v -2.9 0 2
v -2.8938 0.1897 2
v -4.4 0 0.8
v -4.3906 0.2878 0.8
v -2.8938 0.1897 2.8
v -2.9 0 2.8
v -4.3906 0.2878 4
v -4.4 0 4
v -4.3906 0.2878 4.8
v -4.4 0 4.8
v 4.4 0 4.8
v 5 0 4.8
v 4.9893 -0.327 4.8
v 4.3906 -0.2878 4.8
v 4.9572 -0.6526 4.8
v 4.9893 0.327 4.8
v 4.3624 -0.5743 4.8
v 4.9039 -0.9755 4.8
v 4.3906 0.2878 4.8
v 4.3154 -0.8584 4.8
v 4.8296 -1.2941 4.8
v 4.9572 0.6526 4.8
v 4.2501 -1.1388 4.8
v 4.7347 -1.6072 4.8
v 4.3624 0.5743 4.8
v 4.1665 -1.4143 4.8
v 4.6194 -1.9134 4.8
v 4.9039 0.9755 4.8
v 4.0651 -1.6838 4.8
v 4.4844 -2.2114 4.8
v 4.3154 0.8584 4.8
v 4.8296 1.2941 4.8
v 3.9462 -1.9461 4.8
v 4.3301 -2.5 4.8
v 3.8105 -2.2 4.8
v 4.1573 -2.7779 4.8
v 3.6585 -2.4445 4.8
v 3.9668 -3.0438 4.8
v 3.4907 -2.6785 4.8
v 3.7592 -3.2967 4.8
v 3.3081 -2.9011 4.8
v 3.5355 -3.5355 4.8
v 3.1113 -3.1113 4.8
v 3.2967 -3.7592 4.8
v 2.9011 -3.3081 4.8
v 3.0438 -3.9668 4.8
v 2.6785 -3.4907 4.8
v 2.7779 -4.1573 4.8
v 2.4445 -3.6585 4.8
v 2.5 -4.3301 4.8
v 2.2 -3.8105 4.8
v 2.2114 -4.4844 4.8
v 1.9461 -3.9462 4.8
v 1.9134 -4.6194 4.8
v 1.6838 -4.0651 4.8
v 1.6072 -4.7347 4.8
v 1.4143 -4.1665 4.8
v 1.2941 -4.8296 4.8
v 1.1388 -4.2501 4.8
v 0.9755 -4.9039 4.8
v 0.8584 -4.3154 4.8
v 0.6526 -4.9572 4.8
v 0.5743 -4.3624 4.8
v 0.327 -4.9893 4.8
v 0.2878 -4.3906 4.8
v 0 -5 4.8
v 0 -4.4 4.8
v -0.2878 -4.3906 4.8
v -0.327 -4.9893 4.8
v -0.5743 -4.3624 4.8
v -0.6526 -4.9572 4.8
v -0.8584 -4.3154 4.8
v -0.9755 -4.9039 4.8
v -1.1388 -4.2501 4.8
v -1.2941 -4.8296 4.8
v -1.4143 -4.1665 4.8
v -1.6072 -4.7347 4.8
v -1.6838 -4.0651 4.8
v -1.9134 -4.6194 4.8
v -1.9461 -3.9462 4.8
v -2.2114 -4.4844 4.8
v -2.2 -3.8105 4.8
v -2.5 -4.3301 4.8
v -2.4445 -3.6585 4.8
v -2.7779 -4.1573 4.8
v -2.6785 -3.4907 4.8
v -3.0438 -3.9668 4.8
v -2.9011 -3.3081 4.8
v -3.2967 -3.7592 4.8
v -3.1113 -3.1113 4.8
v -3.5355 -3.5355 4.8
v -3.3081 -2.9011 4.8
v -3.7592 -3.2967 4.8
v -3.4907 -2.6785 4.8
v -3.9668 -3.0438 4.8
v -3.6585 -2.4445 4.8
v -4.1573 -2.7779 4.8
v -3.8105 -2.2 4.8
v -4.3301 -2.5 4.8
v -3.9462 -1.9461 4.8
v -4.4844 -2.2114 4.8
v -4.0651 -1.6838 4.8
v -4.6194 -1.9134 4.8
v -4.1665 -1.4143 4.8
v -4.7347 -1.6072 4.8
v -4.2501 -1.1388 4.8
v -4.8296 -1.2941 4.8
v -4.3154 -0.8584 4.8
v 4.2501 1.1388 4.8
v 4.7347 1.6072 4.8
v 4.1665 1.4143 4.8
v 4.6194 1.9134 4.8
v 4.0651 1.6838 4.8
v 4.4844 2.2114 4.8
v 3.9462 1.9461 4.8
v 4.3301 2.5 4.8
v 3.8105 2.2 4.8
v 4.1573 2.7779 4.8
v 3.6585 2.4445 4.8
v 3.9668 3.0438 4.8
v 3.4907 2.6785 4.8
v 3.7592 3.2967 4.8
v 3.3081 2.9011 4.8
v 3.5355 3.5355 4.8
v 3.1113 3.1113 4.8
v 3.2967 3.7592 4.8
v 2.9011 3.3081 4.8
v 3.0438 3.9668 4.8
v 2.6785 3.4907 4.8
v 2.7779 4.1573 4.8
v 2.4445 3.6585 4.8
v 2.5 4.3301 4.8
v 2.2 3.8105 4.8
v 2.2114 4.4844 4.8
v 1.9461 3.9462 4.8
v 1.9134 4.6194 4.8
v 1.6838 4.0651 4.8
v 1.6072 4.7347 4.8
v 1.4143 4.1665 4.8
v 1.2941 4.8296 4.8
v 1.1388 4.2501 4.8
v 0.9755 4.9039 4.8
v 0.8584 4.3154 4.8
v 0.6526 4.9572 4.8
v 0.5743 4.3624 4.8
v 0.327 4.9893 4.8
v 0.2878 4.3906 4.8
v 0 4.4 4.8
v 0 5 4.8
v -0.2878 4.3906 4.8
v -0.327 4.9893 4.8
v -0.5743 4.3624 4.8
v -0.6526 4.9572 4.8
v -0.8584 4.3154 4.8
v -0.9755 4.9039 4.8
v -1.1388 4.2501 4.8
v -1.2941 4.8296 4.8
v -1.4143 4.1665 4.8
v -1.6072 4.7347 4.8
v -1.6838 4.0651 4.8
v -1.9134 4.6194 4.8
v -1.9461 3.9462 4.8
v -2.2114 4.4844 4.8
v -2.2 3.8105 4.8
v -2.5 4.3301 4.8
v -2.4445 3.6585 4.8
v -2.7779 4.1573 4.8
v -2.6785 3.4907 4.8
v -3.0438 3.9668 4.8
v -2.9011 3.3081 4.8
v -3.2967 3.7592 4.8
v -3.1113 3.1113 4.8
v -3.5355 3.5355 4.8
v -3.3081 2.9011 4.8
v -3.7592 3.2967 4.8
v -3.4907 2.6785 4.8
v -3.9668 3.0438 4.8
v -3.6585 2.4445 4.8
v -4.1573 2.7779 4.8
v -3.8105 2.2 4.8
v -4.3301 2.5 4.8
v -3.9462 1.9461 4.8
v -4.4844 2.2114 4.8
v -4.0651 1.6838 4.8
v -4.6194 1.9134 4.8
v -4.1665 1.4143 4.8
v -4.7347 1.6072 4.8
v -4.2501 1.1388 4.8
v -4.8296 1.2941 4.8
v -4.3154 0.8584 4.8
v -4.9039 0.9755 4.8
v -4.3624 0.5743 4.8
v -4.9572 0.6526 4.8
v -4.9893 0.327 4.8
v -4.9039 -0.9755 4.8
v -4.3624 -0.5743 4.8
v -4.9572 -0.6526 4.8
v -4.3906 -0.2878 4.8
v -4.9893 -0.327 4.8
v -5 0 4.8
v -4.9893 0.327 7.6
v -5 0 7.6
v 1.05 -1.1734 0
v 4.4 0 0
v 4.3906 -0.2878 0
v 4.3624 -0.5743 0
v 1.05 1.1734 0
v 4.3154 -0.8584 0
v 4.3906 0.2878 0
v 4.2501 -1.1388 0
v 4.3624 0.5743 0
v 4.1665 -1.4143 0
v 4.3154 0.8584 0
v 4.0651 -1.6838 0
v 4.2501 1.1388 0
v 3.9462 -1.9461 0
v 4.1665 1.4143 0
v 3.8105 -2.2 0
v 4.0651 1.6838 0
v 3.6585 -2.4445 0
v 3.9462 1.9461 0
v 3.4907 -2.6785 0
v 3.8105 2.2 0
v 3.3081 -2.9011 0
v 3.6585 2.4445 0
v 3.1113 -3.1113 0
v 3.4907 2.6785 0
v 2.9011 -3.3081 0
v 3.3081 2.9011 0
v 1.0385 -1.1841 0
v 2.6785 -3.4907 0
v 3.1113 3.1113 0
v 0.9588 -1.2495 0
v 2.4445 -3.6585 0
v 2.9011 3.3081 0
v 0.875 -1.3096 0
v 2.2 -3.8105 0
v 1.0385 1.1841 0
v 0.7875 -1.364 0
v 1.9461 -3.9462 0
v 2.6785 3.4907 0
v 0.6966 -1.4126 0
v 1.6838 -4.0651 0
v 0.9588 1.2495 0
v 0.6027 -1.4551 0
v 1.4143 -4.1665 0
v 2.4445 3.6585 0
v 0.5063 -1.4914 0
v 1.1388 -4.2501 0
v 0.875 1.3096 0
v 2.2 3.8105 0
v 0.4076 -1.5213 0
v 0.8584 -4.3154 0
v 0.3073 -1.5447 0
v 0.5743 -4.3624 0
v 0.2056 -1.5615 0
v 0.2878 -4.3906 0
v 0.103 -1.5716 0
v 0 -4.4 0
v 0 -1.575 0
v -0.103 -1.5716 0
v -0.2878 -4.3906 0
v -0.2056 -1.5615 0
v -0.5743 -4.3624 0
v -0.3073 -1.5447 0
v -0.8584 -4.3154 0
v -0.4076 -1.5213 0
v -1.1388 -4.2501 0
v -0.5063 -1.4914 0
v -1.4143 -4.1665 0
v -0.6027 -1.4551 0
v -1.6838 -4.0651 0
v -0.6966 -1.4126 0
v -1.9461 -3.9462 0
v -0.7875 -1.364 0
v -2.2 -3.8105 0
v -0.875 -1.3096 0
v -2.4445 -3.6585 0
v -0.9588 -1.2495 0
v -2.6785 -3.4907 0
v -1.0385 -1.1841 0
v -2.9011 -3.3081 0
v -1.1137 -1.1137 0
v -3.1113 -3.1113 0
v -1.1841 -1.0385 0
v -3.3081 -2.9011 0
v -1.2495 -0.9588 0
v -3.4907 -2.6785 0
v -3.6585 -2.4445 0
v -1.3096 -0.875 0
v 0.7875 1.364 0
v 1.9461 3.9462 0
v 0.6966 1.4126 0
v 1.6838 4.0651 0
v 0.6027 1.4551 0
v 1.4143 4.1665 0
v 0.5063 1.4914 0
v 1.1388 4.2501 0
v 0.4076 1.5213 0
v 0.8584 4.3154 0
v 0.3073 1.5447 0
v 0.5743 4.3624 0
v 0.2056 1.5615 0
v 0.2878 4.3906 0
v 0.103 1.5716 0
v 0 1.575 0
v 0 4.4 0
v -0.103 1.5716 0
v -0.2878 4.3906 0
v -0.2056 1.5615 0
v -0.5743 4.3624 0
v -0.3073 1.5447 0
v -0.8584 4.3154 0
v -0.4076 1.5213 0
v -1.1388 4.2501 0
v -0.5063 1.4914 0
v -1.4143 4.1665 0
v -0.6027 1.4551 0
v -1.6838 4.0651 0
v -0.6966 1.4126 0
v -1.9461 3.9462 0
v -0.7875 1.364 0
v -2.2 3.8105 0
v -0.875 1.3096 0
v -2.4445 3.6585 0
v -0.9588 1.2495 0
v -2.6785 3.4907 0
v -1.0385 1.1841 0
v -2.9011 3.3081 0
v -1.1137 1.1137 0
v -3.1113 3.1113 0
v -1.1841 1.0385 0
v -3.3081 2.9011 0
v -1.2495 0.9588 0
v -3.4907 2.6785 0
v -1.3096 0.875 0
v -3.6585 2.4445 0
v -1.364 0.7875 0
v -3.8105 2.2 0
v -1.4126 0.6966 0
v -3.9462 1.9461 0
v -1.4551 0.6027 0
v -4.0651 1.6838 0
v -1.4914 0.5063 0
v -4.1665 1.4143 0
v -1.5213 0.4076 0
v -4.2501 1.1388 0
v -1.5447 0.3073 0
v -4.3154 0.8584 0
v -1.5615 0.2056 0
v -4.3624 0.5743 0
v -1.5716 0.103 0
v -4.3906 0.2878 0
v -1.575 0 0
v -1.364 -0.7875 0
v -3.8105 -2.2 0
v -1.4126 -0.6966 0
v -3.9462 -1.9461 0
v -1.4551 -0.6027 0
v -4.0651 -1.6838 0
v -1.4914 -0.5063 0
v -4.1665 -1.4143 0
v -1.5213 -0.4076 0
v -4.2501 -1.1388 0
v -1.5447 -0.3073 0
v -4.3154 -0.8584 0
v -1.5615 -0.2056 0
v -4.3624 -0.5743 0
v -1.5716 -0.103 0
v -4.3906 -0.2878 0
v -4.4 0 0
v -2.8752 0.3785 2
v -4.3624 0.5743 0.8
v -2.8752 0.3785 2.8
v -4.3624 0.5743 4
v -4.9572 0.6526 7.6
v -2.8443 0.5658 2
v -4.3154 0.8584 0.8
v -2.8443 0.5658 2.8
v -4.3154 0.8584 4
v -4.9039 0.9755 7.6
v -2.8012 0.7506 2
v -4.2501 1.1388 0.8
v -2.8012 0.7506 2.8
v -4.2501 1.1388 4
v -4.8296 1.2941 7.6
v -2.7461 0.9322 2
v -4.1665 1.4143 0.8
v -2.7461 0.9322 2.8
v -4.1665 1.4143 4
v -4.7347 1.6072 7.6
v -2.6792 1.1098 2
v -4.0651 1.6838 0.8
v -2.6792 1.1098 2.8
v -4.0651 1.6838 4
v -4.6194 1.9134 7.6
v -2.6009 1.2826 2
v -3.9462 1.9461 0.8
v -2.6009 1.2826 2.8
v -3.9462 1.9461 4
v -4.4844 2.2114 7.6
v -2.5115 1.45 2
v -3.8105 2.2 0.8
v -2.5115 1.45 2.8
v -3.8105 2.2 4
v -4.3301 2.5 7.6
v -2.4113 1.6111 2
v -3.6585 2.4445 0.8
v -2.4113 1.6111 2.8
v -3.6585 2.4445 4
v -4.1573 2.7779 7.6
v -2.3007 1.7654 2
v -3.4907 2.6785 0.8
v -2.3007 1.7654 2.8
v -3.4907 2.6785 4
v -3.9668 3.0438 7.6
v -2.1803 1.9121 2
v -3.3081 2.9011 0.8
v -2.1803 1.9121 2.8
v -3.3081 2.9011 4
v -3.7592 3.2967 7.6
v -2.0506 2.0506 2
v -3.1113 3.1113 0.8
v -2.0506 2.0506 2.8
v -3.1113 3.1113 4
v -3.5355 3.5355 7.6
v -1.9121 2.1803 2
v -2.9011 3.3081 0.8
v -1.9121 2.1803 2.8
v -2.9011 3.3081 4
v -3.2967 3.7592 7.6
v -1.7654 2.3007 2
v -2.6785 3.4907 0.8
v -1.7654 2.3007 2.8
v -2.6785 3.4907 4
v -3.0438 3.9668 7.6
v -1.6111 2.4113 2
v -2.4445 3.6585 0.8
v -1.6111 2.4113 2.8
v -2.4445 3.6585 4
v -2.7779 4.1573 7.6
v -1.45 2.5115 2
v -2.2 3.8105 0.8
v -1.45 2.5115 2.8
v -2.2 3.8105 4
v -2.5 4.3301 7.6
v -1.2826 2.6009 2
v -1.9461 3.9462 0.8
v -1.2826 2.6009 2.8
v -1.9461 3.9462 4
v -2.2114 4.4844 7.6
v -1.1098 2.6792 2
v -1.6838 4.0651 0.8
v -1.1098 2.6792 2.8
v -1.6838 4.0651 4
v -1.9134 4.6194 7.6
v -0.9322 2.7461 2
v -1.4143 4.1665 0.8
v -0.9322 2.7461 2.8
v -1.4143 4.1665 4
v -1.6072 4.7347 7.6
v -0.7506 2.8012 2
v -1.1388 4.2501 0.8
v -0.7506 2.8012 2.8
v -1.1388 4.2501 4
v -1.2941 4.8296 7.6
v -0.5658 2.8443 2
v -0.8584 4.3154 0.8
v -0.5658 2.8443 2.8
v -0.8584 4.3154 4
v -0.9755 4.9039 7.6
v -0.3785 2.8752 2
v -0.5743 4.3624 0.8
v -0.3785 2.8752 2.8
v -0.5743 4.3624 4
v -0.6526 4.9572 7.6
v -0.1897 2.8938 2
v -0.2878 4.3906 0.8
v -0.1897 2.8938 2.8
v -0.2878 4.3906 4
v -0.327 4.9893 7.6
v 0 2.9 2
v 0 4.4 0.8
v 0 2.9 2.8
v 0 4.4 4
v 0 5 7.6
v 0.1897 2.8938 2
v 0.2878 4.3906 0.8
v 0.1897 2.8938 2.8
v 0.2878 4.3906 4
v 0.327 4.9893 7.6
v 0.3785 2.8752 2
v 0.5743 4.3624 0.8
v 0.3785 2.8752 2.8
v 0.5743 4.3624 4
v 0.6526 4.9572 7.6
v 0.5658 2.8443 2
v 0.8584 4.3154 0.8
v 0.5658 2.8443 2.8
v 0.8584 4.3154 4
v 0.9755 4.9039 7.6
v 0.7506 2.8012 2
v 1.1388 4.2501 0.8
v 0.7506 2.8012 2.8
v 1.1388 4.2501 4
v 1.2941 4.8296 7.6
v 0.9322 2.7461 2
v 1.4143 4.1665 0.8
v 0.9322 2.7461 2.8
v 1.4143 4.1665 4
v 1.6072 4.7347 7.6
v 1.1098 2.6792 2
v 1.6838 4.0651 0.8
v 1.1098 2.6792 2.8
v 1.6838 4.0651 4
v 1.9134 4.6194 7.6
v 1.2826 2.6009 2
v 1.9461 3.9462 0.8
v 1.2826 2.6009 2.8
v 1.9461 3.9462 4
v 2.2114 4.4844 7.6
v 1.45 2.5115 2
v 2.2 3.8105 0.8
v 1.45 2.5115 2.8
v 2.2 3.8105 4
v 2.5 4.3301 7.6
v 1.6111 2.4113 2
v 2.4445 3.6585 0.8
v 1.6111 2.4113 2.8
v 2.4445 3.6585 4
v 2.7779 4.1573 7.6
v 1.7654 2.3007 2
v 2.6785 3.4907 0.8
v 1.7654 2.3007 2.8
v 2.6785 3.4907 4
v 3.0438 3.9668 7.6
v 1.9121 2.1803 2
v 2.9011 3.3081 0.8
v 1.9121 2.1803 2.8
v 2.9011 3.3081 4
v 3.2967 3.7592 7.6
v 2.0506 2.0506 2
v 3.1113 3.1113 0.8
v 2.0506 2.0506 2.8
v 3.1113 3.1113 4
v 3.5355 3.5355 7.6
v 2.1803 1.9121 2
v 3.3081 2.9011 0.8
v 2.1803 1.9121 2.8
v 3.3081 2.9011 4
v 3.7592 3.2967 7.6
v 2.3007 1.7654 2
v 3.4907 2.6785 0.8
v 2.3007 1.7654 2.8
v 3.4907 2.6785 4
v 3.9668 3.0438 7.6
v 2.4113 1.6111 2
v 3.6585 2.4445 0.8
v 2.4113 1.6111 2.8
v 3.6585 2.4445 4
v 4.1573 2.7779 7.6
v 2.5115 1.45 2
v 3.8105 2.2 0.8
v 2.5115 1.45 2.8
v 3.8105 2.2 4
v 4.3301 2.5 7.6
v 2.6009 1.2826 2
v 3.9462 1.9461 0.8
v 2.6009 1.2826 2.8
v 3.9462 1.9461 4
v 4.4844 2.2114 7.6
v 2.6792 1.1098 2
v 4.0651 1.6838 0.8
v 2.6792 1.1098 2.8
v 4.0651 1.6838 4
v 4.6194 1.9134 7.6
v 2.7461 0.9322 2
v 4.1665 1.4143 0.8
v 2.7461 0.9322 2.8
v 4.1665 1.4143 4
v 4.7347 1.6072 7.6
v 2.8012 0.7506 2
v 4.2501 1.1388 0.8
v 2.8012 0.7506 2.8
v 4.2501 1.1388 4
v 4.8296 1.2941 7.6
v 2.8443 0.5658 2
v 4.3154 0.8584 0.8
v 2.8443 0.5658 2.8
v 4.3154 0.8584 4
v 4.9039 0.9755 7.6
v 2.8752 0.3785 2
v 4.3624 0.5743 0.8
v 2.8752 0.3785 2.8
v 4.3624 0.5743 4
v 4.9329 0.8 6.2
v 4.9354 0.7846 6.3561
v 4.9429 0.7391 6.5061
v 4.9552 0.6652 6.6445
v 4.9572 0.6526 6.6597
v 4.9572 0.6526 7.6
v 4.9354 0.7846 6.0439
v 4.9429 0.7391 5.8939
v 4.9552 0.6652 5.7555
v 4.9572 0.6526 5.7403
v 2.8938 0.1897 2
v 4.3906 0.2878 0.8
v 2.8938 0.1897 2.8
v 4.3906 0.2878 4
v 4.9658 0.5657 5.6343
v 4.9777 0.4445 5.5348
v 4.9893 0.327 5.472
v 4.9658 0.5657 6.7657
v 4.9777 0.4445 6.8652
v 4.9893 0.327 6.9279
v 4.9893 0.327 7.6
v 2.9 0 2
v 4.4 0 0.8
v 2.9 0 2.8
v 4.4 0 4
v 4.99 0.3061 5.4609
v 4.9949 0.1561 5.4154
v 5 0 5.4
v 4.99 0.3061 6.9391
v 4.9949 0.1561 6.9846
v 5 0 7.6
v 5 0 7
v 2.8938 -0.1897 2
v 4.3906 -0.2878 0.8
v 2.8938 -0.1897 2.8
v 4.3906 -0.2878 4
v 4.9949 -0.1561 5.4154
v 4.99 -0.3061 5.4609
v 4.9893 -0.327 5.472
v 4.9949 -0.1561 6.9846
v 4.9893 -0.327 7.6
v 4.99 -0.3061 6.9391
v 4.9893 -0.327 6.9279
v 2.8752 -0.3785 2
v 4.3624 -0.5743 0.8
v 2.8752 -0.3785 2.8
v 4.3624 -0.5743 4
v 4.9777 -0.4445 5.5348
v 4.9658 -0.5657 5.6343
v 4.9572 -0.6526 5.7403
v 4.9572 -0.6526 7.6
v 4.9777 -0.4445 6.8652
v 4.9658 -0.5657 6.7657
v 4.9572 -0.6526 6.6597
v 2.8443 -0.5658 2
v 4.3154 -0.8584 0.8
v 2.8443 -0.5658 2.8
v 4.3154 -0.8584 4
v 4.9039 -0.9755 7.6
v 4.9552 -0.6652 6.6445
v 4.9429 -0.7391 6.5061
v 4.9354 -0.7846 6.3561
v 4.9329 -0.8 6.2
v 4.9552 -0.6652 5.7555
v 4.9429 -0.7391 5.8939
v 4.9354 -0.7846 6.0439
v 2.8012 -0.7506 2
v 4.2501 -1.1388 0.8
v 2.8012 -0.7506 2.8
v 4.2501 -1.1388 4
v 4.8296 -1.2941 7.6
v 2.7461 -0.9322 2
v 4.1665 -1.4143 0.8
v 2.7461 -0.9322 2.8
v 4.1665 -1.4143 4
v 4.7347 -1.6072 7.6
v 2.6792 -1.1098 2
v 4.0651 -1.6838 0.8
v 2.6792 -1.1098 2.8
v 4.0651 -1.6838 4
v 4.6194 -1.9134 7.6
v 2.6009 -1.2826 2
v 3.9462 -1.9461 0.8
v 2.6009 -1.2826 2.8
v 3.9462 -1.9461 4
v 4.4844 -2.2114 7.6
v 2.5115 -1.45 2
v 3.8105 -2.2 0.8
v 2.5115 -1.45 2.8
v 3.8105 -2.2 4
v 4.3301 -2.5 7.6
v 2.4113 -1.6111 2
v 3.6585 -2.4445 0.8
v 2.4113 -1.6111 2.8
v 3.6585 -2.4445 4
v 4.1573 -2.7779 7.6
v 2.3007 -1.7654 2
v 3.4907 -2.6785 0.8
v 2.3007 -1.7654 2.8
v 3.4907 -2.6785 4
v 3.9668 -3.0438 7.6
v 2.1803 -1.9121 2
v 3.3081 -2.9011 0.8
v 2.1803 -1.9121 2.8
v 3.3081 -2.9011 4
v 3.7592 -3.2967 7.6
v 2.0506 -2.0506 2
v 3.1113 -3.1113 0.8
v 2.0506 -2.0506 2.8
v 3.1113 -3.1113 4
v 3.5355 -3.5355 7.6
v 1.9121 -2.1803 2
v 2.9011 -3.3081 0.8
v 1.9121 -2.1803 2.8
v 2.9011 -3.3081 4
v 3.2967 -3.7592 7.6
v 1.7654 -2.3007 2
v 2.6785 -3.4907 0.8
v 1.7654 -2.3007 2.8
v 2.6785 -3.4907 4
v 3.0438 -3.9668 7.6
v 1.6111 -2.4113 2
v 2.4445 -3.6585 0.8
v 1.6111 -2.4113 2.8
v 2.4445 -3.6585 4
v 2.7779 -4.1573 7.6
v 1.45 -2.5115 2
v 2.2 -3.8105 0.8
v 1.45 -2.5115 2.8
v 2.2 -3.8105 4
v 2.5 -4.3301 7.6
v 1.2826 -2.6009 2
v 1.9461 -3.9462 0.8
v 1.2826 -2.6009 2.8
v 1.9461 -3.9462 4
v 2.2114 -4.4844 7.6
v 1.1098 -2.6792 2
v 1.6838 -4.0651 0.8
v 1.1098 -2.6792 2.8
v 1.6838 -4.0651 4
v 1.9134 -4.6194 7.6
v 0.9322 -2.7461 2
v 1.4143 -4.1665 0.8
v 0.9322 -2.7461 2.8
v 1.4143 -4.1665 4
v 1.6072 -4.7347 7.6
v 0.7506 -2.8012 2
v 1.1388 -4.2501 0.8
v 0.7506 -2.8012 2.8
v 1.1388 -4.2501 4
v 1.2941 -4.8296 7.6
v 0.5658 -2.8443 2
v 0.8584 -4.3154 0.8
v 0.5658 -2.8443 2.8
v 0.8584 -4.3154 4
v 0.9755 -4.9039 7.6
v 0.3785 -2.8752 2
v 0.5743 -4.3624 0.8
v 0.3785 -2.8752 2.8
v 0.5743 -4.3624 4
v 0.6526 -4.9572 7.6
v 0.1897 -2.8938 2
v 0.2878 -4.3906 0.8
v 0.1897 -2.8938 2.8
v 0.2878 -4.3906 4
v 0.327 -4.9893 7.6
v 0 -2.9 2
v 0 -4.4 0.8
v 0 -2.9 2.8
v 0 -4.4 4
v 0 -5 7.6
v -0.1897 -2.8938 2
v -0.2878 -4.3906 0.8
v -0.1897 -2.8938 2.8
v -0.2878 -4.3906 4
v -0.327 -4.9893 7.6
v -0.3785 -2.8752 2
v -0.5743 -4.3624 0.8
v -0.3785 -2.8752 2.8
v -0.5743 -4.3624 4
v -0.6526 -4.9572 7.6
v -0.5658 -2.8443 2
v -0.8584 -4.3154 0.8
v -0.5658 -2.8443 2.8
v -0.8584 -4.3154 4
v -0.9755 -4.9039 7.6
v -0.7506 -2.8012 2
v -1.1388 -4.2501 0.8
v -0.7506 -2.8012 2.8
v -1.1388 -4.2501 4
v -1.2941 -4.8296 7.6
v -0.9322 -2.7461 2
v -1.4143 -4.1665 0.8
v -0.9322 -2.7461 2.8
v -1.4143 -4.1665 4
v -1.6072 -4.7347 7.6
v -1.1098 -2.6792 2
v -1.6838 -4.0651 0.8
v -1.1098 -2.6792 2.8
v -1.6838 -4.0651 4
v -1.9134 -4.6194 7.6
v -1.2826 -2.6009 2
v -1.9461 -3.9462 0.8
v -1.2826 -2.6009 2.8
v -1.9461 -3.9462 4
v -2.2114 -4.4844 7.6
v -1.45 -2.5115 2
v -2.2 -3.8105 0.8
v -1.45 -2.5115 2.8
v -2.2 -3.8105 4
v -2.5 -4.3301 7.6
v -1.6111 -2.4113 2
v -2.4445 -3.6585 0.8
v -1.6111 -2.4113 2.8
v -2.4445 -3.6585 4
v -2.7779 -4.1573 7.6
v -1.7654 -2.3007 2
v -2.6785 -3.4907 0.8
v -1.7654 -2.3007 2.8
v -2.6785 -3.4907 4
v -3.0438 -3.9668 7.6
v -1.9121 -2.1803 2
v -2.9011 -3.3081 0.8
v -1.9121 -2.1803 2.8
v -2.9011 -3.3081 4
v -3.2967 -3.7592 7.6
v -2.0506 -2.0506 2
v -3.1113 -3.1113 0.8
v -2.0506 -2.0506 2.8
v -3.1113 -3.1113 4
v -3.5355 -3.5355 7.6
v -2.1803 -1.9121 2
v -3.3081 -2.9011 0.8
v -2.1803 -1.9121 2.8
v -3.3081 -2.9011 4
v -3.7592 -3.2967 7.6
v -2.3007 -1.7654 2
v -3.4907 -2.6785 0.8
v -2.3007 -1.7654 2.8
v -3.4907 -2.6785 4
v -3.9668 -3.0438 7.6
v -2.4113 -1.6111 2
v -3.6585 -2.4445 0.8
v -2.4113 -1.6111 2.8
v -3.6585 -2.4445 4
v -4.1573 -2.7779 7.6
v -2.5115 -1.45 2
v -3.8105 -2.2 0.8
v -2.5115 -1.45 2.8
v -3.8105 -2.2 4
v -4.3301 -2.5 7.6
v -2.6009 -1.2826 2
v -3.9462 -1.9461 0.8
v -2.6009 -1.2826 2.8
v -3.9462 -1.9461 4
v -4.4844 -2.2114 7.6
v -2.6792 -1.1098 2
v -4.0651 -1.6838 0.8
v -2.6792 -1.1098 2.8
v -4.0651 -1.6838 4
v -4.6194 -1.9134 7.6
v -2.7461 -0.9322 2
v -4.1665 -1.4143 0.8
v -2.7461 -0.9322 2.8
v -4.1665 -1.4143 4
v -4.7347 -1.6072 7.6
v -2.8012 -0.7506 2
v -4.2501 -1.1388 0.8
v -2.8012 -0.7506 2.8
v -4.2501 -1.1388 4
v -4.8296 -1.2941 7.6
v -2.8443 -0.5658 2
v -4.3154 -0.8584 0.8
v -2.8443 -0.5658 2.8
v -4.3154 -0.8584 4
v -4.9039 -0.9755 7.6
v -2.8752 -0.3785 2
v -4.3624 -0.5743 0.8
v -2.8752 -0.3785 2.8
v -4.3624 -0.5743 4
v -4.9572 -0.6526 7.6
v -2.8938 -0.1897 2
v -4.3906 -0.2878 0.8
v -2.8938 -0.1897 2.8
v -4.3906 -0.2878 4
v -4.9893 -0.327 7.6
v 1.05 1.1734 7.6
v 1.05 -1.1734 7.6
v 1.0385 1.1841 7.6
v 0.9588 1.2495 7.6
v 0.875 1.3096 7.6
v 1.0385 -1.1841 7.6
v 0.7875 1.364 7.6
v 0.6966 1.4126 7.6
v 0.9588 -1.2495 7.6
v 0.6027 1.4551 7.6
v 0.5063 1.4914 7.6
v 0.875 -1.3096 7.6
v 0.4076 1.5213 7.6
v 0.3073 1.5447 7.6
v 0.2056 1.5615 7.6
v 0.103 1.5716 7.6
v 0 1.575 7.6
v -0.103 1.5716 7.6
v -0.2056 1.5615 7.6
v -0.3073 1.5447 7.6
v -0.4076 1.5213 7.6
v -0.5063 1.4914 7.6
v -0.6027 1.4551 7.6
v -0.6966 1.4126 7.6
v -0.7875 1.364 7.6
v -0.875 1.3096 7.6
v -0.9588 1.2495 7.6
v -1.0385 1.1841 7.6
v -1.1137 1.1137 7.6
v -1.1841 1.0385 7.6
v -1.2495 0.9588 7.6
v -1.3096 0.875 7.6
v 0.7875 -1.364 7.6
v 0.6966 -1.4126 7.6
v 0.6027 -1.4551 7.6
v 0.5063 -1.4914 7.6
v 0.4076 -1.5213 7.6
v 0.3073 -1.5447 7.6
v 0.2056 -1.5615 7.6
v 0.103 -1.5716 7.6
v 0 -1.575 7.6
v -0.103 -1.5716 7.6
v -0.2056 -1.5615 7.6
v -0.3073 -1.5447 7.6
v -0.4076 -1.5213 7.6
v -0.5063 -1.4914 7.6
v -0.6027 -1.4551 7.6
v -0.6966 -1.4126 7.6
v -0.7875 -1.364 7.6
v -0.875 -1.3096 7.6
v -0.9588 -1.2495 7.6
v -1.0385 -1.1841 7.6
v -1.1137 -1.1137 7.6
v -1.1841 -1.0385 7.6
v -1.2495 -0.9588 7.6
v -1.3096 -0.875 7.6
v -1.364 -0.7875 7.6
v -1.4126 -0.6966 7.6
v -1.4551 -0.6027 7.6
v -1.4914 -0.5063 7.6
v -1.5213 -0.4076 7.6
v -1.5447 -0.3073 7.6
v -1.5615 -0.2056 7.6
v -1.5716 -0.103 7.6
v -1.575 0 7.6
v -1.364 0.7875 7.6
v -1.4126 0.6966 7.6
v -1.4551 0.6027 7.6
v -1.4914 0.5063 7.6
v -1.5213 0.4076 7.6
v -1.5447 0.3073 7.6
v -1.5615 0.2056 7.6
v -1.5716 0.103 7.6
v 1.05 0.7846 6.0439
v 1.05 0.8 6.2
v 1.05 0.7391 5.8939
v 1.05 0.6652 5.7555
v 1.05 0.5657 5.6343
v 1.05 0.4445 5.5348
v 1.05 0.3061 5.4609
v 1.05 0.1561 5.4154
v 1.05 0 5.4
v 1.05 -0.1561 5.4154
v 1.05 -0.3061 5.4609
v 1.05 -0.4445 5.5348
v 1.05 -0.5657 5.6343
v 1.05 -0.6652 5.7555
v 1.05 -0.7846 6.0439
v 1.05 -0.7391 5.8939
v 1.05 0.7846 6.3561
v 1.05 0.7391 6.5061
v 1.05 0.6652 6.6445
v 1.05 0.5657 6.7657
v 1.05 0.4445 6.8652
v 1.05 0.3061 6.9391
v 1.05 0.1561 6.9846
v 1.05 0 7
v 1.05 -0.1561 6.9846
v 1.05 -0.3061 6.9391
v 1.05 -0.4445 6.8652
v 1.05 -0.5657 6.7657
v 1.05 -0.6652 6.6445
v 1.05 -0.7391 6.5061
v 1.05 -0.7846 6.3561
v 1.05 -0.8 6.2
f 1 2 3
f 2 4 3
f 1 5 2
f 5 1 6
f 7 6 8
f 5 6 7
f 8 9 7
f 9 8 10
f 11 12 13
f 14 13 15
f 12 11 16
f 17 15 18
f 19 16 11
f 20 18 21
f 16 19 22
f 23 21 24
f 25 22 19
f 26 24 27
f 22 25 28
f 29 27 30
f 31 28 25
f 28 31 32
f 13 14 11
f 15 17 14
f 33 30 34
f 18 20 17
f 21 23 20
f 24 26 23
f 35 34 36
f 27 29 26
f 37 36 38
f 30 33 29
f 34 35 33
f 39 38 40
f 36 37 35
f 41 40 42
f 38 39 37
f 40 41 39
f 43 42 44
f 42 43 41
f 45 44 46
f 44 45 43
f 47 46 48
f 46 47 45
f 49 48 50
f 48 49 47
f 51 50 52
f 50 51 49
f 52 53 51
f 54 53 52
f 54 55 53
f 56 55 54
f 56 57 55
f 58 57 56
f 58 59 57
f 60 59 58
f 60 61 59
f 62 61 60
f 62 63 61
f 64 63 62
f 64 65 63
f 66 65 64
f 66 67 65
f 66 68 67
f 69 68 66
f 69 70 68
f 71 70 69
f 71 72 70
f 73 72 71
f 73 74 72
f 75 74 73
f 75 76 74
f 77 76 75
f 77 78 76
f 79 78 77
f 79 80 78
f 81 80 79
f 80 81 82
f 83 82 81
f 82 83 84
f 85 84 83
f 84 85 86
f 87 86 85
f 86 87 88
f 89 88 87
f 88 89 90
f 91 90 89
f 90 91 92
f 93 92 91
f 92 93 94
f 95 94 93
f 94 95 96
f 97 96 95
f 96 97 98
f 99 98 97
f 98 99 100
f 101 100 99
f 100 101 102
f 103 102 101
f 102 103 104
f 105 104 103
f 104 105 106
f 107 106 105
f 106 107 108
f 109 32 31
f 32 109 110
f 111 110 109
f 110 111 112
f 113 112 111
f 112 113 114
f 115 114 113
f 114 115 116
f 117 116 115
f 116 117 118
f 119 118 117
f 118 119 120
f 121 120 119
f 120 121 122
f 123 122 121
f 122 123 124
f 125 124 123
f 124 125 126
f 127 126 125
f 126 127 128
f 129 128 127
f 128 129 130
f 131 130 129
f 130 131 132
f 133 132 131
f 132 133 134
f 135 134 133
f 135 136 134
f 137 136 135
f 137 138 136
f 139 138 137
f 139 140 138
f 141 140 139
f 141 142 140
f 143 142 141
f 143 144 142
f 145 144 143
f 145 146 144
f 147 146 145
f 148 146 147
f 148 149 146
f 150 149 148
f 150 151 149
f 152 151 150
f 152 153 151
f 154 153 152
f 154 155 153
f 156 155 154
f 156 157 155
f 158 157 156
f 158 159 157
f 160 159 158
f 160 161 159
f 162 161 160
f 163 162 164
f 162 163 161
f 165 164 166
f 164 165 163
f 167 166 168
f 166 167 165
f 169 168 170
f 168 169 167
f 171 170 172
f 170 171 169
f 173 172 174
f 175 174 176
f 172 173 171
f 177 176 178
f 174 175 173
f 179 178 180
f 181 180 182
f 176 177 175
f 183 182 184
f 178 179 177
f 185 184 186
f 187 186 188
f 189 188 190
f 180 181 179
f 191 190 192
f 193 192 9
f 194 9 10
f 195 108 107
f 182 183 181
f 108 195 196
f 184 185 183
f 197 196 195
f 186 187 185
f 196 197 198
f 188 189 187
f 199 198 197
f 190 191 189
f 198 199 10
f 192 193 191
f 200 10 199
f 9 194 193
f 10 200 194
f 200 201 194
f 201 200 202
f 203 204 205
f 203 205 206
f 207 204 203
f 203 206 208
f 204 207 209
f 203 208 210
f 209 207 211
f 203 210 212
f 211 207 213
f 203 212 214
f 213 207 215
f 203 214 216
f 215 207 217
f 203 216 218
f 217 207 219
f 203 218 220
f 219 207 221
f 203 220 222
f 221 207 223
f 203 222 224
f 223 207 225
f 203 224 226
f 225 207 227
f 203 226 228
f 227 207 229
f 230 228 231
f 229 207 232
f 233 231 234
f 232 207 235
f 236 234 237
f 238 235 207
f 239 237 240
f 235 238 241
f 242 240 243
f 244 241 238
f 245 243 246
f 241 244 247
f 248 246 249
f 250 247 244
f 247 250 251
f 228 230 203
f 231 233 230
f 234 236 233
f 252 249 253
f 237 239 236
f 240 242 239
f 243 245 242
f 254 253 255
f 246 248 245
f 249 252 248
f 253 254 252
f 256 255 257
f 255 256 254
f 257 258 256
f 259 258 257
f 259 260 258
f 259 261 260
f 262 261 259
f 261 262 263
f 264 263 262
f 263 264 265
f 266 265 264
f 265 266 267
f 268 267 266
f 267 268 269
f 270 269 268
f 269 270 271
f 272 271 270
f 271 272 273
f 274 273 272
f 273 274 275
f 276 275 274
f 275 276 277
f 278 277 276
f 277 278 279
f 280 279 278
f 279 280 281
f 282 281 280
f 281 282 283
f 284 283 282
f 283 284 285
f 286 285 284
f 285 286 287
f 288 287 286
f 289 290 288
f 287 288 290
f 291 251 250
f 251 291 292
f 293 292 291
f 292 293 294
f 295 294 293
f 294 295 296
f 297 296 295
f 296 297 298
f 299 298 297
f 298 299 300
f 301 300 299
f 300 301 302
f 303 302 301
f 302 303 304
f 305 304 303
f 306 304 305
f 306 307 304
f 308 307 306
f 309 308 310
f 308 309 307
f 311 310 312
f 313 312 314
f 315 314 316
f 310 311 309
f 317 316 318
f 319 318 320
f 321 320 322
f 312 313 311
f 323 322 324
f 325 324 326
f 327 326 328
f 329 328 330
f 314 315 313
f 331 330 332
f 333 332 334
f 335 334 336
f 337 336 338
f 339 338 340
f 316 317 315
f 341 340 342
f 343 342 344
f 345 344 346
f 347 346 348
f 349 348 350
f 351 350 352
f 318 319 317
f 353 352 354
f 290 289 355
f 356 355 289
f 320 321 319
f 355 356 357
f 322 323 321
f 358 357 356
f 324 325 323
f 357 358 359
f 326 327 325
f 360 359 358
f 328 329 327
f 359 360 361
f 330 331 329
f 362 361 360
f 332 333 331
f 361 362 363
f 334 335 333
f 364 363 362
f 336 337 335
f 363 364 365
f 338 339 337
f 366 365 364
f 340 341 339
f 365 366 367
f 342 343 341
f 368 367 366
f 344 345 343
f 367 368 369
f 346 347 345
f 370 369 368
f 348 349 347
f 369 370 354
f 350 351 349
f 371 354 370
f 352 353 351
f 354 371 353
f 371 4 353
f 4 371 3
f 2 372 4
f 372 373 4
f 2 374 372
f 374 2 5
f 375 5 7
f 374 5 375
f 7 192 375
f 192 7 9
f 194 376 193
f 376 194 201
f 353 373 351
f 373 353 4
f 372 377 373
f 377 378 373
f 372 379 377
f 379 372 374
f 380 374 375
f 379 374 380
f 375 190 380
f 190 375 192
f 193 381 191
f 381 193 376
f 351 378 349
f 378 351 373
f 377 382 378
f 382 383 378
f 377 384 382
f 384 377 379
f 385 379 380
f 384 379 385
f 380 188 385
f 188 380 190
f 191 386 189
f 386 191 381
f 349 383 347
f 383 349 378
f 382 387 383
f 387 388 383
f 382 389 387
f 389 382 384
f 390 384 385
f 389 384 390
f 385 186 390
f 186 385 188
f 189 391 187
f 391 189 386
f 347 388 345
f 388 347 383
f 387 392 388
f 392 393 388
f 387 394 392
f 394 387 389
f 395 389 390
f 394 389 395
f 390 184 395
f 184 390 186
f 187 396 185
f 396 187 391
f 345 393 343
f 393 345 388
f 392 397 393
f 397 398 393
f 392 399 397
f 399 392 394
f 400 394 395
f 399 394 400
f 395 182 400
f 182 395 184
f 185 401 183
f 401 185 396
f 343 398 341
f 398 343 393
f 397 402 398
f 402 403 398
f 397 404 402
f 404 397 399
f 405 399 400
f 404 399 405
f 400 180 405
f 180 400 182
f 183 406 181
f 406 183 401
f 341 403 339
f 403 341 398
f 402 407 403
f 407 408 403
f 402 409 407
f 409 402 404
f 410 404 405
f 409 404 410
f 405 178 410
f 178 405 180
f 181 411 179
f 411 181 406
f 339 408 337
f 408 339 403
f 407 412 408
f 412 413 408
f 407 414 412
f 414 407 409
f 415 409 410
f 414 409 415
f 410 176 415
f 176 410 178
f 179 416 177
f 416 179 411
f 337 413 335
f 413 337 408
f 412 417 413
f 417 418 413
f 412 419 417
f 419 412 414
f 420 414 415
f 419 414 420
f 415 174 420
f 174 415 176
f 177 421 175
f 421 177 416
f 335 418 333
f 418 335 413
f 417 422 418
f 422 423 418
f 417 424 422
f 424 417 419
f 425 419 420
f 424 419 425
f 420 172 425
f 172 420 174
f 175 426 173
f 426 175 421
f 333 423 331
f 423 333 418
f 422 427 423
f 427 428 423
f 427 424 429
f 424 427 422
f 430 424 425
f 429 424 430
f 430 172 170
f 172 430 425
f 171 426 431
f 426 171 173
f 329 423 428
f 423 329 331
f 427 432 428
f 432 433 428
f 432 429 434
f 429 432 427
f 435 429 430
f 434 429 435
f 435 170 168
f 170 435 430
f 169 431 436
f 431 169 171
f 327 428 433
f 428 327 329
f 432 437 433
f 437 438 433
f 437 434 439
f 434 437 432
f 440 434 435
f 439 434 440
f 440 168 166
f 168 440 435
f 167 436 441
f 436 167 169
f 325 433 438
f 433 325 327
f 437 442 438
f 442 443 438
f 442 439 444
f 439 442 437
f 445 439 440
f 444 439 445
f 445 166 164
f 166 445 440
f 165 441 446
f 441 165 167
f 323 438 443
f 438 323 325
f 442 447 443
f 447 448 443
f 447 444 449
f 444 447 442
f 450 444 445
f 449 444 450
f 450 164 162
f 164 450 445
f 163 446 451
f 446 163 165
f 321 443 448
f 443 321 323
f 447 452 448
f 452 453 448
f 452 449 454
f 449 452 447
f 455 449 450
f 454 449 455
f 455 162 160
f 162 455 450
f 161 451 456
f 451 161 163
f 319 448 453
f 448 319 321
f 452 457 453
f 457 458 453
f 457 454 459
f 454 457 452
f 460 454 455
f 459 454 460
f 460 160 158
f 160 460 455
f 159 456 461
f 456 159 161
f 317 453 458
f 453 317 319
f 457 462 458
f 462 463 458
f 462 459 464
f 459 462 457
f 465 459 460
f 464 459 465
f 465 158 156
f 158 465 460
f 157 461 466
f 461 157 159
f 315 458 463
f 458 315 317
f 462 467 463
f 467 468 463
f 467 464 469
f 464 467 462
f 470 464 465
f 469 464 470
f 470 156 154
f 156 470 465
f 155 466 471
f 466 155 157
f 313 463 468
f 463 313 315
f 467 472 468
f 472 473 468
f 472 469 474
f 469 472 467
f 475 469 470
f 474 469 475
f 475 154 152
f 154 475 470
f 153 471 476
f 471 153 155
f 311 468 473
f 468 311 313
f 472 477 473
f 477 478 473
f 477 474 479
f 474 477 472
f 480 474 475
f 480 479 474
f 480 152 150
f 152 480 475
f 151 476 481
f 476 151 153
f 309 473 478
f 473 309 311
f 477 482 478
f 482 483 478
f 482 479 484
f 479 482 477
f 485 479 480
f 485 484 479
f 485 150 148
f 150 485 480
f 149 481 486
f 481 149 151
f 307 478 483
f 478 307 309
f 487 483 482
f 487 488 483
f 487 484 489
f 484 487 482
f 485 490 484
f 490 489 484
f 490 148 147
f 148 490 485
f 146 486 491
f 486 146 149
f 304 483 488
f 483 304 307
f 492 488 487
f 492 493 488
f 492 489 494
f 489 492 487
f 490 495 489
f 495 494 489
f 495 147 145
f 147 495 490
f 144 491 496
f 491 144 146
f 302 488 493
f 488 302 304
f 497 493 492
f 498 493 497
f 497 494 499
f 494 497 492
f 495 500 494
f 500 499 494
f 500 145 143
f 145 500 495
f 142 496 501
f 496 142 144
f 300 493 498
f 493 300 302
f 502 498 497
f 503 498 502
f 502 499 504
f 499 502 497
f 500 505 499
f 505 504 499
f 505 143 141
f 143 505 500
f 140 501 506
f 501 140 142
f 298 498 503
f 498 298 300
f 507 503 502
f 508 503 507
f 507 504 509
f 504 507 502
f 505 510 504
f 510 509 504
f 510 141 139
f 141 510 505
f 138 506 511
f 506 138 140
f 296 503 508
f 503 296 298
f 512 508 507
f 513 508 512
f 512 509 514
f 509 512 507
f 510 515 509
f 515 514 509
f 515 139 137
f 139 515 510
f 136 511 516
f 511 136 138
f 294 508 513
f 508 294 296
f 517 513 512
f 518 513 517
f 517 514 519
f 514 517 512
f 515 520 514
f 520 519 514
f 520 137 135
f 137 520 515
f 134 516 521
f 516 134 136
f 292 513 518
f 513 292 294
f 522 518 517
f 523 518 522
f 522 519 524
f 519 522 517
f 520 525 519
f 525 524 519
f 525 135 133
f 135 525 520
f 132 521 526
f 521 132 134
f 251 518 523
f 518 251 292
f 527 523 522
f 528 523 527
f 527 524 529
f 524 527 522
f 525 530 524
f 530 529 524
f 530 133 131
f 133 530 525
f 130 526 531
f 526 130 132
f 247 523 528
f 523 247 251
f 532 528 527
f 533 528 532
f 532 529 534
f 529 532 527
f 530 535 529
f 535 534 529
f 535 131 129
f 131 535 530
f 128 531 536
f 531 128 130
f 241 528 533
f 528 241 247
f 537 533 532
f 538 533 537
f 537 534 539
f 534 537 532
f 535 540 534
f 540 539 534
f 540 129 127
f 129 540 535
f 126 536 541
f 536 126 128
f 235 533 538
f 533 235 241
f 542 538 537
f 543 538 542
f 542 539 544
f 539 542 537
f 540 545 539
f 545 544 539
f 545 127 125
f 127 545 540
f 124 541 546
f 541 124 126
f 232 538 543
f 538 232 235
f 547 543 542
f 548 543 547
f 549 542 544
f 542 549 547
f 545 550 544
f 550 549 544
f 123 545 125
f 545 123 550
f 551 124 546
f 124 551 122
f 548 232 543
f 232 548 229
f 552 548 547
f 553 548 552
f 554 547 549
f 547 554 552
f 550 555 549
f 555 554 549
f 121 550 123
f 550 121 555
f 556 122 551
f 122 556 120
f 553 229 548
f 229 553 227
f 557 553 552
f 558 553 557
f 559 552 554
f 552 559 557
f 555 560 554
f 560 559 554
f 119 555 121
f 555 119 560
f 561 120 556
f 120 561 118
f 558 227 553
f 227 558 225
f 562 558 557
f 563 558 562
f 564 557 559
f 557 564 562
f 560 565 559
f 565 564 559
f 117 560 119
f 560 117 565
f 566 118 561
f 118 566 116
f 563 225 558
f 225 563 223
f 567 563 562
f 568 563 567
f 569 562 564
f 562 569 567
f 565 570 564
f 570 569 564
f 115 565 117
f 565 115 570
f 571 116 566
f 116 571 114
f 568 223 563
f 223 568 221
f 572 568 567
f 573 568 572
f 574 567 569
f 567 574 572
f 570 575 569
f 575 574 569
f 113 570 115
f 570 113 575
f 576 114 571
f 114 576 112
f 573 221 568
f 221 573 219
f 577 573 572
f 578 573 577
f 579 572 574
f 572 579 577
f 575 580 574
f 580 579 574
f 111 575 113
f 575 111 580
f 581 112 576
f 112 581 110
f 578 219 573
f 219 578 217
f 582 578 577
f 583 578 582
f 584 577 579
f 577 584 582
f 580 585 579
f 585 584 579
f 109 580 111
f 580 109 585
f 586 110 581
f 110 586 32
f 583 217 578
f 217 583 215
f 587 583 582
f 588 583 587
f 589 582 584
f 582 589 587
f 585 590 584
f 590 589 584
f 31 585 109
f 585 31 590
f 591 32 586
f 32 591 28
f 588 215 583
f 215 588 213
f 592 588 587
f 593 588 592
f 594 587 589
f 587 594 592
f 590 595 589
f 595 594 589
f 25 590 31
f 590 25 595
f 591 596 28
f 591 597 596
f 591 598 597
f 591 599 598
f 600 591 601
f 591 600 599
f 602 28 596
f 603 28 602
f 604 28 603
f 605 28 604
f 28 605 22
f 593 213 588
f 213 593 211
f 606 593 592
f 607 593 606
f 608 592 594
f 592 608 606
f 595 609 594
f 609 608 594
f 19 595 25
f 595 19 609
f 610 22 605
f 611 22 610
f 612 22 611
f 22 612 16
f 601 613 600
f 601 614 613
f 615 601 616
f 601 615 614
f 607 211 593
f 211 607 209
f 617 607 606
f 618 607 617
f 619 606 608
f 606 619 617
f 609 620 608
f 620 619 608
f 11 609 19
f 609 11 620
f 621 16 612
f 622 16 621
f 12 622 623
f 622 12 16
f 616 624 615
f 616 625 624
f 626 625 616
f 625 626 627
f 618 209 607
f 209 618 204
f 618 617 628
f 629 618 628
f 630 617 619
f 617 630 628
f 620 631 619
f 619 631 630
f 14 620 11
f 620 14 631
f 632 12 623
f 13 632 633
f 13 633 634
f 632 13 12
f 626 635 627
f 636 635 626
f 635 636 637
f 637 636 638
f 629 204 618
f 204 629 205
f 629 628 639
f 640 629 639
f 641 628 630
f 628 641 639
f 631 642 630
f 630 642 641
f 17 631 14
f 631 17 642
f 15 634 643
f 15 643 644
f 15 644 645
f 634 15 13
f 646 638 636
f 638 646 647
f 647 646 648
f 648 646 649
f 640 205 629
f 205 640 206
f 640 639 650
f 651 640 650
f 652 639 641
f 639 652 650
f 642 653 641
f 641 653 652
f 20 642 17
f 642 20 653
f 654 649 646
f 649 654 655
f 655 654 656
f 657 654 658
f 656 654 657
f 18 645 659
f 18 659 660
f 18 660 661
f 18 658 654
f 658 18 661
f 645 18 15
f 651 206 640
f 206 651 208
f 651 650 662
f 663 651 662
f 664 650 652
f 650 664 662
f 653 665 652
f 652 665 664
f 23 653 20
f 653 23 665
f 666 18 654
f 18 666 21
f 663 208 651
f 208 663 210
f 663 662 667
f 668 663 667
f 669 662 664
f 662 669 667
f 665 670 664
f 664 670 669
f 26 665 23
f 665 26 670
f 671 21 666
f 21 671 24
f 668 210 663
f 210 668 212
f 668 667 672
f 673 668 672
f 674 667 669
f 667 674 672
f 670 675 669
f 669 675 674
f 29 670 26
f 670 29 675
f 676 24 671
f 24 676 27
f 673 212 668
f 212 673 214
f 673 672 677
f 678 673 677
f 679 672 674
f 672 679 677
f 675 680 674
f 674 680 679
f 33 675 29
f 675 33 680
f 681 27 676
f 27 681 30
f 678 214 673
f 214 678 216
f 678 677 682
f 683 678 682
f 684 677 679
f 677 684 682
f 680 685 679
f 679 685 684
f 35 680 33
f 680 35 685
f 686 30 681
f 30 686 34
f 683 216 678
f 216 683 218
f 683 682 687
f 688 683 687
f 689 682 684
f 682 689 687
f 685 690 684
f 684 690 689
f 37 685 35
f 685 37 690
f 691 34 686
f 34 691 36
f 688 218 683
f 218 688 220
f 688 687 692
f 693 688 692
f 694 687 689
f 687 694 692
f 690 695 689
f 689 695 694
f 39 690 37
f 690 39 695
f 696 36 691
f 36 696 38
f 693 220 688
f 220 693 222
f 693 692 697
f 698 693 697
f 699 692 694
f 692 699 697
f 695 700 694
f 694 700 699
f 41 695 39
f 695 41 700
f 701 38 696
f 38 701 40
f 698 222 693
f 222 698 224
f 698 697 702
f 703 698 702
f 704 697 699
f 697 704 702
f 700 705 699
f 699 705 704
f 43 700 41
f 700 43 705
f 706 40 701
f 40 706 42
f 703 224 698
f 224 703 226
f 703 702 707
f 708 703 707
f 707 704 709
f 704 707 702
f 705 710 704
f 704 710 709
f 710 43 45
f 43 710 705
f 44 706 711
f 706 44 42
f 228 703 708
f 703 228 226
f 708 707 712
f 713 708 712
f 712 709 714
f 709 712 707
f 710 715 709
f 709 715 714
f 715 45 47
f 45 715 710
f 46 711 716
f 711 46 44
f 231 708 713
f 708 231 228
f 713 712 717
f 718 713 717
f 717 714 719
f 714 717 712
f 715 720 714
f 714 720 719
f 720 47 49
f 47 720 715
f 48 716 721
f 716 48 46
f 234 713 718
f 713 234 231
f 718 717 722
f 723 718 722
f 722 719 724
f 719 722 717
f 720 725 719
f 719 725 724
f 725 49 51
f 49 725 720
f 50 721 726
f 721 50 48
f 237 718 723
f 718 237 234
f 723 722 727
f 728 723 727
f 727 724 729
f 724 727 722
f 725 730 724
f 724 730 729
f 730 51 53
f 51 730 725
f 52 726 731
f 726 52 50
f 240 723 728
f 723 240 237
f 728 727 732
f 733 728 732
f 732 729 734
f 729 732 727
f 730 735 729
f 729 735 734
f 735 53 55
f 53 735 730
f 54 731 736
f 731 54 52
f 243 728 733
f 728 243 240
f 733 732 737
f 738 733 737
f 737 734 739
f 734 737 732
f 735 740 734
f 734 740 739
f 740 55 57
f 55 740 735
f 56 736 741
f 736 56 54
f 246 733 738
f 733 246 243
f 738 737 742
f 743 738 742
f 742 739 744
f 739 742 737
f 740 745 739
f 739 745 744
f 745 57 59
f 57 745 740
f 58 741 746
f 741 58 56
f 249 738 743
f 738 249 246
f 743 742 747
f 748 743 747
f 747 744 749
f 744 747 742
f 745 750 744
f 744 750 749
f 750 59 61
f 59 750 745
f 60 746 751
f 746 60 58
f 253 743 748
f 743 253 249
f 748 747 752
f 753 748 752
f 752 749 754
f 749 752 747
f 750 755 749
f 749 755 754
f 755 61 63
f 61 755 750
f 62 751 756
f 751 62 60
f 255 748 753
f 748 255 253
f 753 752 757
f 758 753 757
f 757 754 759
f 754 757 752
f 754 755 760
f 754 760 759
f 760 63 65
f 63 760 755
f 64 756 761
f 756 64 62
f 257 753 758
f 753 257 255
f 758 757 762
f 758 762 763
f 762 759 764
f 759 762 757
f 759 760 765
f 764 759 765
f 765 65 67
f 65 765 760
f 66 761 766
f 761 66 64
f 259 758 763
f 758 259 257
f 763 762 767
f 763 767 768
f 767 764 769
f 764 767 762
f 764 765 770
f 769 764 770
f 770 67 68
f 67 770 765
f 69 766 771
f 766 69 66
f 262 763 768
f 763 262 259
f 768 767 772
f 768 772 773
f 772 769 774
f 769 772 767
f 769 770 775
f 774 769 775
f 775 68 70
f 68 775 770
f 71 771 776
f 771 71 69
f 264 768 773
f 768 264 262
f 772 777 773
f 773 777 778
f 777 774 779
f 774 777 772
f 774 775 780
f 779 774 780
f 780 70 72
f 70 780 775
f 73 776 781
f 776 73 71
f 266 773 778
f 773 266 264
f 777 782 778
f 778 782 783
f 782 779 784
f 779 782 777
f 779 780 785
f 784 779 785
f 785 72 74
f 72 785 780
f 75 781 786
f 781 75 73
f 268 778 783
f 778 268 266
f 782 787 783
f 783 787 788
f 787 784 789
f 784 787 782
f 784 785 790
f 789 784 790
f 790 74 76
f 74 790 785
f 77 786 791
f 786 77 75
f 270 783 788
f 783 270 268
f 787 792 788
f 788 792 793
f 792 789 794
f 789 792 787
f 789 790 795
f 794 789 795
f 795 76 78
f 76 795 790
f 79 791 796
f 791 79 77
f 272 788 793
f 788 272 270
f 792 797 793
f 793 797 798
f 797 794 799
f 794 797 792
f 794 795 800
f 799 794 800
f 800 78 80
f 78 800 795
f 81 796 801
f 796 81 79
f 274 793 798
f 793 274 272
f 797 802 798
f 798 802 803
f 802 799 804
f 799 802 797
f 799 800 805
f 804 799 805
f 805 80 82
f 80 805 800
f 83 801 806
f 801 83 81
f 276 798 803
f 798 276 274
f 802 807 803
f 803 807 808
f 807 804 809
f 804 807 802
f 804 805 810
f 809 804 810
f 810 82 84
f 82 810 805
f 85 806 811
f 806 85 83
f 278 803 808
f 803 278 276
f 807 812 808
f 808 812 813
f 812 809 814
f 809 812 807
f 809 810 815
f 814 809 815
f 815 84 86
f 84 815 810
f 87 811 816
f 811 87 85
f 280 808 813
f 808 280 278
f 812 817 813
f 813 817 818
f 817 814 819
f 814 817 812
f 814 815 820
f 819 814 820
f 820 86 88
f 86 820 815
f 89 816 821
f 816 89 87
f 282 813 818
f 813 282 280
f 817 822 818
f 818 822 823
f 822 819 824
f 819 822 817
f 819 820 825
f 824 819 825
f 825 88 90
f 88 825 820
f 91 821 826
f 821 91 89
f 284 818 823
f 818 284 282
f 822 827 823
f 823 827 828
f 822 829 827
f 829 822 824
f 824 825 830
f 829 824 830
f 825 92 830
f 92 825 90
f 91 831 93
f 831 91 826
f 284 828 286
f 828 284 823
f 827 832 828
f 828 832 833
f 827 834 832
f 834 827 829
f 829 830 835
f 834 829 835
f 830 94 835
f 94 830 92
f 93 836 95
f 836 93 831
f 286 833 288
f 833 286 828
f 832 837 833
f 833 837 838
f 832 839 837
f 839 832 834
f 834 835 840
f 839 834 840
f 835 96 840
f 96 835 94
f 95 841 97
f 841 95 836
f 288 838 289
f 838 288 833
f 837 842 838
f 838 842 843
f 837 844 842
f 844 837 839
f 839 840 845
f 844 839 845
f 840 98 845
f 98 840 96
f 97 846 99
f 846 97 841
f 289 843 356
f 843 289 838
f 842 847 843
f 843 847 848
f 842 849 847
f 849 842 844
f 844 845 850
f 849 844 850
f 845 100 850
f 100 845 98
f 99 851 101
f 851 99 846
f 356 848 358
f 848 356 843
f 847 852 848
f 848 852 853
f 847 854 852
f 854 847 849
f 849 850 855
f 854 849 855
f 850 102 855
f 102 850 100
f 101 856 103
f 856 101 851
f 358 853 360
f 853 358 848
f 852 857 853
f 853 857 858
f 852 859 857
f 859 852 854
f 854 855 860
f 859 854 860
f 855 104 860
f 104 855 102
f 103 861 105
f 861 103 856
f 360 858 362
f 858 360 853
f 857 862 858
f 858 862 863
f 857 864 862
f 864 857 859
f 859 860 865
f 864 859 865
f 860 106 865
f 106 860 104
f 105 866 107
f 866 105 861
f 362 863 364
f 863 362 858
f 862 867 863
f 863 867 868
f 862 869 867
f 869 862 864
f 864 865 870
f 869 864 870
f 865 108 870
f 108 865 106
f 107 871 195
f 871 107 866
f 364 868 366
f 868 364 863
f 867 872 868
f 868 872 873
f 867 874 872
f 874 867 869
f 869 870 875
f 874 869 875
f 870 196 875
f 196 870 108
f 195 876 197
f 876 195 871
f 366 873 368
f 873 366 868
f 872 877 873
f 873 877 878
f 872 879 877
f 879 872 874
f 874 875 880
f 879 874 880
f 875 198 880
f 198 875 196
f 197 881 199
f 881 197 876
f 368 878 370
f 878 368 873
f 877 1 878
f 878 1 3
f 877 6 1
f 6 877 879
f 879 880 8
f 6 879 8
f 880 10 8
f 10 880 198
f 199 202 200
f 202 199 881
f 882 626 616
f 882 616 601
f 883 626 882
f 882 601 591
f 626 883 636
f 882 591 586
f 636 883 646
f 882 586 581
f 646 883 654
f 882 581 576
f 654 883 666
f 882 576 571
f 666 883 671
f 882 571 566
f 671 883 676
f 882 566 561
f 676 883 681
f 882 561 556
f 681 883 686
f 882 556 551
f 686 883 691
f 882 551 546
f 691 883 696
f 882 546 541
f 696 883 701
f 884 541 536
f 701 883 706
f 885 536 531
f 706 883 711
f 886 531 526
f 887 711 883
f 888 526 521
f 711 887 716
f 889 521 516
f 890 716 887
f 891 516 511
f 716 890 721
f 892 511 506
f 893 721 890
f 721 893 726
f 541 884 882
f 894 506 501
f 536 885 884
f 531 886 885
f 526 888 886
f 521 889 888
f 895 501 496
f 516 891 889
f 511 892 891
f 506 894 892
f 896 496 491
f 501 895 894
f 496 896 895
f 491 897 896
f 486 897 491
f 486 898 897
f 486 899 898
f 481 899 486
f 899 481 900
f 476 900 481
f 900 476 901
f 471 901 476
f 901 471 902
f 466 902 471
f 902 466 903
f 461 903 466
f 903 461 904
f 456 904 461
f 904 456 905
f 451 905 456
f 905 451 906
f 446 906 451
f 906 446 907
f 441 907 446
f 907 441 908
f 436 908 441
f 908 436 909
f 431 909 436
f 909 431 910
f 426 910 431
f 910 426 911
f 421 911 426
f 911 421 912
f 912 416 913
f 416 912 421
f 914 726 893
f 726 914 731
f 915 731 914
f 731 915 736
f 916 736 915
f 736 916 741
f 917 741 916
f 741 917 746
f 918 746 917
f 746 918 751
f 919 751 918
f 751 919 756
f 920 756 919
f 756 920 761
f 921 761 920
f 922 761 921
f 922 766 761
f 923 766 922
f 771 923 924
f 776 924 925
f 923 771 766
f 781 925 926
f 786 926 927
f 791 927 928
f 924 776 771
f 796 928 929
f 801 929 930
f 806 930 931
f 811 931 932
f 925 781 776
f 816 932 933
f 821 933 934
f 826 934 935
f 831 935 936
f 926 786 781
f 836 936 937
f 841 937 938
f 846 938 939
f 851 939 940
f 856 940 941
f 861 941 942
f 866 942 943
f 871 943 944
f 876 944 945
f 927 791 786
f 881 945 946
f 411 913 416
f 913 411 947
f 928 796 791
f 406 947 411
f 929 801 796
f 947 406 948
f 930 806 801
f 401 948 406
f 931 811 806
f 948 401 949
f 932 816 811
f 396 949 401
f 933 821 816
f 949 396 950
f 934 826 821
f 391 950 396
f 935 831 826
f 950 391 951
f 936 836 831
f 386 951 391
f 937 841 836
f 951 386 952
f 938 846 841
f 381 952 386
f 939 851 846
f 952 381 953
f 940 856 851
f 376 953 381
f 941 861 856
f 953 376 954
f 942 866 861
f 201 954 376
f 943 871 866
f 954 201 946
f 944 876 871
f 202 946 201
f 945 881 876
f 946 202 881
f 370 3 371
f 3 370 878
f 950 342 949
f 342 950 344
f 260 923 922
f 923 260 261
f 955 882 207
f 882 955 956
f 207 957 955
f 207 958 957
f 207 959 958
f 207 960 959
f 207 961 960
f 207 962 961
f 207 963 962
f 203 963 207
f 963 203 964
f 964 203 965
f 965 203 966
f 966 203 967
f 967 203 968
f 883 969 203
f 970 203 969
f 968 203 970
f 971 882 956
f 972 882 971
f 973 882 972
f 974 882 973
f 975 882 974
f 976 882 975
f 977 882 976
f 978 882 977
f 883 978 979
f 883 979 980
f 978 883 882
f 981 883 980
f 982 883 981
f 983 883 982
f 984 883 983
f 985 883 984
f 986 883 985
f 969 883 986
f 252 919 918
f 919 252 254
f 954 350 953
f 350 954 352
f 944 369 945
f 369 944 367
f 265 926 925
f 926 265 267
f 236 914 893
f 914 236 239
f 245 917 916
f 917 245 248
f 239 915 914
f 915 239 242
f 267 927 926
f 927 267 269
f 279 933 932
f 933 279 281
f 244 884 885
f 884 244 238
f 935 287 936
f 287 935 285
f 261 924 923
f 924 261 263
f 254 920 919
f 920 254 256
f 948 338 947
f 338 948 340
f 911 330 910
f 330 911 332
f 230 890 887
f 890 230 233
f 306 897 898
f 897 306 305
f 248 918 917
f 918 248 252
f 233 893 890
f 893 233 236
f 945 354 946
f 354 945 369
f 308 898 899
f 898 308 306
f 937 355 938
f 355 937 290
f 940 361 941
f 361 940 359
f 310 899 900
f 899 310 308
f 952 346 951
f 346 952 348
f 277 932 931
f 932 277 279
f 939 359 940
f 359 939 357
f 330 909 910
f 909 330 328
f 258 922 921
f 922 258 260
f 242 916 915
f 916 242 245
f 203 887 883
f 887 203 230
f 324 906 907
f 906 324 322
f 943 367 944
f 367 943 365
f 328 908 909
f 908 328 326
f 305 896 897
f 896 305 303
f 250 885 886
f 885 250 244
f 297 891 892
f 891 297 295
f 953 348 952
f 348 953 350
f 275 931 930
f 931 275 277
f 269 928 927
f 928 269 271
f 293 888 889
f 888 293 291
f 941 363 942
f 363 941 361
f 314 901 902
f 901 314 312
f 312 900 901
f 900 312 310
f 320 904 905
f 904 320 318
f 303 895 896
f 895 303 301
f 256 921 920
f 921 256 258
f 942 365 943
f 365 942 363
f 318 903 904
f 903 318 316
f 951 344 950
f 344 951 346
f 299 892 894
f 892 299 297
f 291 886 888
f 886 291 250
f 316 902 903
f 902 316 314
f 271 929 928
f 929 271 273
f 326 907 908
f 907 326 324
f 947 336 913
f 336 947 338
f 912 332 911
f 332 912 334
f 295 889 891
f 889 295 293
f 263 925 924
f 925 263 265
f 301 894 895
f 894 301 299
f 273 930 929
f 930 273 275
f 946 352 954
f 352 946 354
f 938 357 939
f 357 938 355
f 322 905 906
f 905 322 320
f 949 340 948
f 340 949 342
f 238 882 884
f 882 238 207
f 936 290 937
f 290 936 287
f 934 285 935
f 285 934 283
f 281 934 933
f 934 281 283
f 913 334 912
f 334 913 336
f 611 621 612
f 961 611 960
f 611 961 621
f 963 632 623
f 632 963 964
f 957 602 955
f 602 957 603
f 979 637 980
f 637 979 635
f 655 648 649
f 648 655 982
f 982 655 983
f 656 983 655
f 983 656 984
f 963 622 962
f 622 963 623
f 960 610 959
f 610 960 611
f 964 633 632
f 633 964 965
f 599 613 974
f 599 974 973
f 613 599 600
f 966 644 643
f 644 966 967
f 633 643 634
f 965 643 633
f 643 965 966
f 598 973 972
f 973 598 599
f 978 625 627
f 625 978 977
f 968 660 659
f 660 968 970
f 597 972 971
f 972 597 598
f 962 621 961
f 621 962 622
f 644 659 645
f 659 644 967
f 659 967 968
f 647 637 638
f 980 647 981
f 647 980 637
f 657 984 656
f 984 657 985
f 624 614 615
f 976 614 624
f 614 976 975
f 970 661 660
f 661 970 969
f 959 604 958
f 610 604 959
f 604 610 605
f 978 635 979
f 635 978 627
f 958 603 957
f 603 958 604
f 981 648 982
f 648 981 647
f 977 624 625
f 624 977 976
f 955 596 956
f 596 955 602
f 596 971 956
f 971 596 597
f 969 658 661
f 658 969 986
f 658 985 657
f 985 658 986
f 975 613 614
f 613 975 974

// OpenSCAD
// フォーカス電動化: 1218 ウォームギアモーター (Akozon 1218GEN20) の出力軸用の小プーリー。2026-11-22。
// レンダリング未確認。軸の寸法は、ユーザーが提供した図面 (Ø3 の D カット、対辺 2.5、突き出し 8) による。
// 単位 mm。z=0 が軸の先端側、+z がモーター側。
// 取り付け: 軸の先端を、セル面から z=1.9 にそろえる (ベルトの面 z=4.3 = 溝の中心 + 1.9)。
//   すると、モーターの面 (軸が出る面) は z=9.9 になる。プーリーの長さは 7.6 で、面との隙間は約 0.4。
// ハブ (focus_hub.scad) の中心円は約 Ø18.3、ここは約 Ø7.2 (O リング線径 1.5)。減速比は約 1:2.5。
// 刷るときは層を細かく (0.1 mm 前後)。刷りにくければ、金属製の小プーリー (D カット Ø3 用) に替える。

$fn = 96;

shaft_d     = 3.0;
flat_across = 2.5;              // D カットの対辺
shaft_len   = 8.0;              // 面からの突き出し
bore_d      = shaft_d + 0.15;
flat_x      = flat_across - shaft_d/2 + 0.05;   // D カットの平面の位置 (+x 側。軸中心から)

root_r   = 2.9;                 // V 溝の底 Ø5.8。底の肉厚 = 2.9 - 1.575 = 1.3
flange_r = root_r + 1.5;
hub_r    = 5.0;
length   = shaft_len - 0.4;     // 7.6
// 溝は幅 3.2 (上端)、底の幅 0.8。フランジ 0.8 + 溝 3.2 + フランジ 0.8、残りがハブ
g_in   = 0.8;
g_out  = g_in + 3.2;
f_end  = g_out + 0.8;
root_w = 0.8;
mid    = (g_in + g_out)/2;      // 溝の中心 = 2.4
screw_z = (f_end + length)/2;   // ハブの中央
pilot_d = 1.6;                  // M2 止めネジの下穴。D カットの平面へ向ける (+x)

pts = [
  [0, 0], [flange_r, 0], [flange_r, g_in],
  [root_r, mid - root_w/2], [root_r, mid + root_w/2],
  [flange_r, g_out], [flange_r, f_end], [hub_r, f_end], [hub_r, length], [0, length]
];

difference() {
  rotate_extrude() polygon(pts);
  translate([0, 0, -0.1]) linear_extrude(length + 0.2)
    intersection() { circle(d = bore_d); translate([-5, -5]) square([5 + flat_x, 10]); }
  translate([0, 0, screw_z]) rotate([0, 90, 0]) cylinder(d = pilot_d, h = hub_r + 1, $fn = 32);
}

echo(str("溝の中心 z=", mid, ", 先端を z=", 4.3 - mid, " に置く, モーター面 z=", 4.3 - mid + shaft_len));
